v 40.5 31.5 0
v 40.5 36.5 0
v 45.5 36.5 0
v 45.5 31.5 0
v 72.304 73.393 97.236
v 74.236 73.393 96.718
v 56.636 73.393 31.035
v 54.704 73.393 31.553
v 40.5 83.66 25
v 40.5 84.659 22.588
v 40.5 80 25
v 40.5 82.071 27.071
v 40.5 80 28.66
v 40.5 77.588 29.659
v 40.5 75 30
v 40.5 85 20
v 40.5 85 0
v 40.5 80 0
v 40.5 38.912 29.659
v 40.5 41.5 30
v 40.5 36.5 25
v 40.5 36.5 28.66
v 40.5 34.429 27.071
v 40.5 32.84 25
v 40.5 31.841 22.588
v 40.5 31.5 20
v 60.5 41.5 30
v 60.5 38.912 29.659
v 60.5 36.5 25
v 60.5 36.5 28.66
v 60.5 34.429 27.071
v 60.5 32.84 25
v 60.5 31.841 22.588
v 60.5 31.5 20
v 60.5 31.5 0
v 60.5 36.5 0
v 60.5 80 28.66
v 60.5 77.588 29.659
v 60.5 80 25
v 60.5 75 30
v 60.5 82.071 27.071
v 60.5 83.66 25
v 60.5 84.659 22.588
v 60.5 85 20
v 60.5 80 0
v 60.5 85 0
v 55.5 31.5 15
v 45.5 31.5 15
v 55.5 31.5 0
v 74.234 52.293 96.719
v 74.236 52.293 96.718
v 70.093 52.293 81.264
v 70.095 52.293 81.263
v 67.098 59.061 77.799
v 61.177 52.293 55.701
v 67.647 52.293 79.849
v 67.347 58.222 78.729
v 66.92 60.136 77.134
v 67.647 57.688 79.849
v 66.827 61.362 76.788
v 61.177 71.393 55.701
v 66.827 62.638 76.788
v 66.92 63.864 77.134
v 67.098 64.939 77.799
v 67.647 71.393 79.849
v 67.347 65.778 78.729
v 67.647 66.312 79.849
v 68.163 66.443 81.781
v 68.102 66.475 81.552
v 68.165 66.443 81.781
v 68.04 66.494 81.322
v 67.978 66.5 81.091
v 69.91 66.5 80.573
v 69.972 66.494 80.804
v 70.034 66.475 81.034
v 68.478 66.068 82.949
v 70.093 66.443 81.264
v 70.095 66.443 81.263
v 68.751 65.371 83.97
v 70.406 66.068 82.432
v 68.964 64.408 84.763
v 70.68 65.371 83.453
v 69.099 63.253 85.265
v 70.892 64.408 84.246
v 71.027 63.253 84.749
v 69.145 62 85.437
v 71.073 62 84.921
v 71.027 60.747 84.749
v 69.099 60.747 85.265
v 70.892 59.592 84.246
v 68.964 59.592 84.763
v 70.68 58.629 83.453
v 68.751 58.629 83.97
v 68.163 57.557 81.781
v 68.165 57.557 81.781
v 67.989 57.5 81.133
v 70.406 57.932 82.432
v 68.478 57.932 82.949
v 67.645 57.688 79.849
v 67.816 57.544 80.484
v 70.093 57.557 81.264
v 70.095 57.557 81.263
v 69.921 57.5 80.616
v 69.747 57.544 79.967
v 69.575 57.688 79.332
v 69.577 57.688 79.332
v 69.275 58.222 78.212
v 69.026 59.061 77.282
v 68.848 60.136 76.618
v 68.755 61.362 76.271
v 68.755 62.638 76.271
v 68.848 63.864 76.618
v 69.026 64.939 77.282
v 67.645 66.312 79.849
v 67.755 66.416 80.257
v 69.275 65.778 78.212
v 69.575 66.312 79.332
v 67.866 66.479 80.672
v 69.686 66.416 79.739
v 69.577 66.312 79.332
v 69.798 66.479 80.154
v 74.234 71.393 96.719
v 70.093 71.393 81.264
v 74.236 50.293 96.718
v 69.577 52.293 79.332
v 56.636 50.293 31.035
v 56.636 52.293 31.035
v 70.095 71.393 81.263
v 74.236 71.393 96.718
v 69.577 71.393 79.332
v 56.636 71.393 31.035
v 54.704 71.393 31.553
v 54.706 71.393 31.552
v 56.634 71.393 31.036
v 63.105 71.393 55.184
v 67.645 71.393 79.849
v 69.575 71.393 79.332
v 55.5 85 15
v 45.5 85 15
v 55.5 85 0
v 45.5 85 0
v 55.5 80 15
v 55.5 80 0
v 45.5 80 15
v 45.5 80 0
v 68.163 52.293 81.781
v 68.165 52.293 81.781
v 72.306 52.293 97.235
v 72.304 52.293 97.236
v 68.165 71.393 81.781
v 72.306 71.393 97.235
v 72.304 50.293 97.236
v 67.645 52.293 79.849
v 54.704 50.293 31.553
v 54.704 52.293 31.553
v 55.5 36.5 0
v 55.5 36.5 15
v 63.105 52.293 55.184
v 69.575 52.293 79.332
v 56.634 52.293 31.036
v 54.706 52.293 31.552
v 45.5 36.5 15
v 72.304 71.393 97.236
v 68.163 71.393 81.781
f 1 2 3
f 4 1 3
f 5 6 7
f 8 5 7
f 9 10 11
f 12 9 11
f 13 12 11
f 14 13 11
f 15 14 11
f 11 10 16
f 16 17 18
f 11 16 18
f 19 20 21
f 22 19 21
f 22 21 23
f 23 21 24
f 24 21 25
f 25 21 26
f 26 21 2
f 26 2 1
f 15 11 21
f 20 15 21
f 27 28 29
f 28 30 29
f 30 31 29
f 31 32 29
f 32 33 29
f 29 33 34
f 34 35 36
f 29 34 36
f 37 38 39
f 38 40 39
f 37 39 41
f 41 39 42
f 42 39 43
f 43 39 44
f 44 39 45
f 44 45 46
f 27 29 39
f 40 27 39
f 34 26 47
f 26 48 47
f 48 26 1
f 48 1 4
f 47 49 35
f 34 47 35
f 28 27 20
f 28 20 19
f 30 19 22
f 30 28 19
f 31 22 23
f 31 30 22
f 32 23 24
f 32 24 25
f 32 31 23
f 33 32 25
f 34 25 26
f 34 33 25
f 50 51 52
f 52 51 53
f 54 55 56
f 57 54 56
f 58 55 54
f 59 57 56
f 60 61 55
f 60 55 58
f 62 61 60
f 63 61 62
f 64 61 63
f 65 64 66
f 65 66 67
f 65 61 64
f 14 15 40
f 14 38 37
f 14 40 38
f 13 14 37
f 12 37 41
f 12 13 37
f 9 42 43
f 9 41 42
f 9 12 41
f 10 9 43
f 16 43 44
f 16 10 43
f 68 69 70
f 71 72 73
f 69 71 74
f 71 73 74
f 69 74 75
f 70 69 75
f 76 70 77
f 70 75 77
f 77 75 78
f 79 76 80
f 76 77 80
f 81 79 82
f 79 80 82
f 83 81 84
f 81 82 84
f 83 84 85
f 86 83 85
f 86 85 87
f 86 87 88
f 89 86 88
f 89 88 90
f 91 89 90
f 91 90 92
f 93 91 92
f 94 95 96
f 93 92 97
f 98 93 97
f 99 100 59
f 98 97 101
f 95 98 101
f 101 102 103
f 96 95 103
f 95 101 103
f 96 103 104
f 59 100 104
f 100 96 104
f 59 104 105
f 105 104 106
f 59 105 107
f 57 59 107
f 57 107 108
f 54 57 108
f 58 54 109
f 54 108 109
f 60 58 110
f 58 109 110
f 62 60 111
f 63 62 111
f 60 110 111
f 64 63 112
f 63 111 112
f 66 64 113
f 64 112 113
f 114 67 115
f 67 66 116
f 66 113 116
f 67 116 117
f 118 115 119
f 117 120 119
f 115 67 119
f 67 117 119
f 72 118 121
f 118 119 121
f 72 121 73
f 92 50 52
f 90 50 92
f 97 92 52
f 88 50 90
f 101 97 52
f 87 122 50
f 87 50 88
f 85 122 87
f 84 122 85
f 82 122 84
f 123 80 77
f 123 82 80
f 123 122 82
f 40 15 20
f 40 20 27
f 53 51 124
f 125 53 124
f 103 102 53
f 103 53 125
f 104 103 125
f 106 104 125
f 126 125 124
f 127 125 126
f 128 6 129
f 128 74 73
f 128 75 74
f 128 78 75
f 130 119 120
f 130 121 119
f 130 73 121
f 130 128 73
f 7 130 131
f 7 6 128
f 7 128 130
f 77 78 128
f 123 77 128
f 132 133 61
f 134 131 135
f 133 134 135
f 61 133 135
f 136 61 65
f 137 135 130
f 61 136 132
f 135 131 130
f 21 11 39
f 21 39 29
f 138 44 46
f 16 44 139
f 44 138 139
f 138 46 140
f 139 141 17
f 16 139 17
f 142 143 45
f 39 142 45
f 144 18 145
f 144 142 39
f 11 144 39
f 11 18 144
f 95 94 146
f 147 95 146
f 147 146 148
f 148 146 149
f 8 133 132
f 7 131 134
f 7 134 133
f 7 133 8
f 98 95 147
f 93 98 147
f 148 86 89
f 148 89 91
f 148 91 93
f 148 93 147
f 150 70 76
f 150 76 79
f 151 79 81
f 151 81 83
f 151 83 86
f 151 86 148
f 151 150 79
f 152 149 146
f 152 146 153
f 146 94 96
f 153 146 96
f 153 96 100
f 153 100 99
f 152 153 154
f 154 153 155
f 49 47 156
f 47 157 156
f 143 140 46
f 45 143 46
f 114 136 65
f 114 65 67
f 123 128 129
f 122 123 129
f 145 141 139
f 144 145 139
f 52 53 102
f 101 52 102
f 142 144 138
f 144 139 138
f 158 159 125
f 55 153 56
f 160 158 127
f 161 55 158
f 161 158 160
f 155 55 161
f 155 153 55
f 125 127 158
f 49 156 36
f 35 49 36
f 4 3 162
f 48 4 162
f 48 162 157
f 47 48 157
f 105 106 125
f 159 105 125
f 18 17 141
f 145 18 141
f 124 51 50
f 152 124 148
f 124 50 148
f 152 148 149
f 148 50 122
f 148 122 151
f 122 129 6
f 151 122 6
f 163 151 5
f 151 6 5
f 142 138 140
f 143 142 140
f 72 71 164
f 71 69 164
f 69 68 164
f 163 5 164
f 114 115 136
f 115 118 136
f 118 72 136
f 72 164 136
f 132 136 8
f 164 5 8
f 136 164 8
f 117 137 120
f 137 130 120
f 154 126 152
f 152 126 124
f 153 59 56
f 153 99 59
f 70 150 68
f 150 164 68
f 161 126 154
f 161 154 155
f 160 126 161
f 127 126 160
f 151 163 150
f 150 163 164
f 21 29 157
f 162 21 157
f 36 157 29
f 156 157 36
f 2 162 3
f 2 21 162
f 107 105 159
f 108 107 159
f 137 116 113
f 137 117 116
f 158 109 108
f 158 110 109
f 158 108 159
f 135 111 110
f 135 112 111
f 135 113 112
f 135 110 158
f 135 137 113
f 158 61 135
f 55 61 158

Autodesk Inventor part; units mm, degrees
ref_plane "YZ Plane" through (0, 0, 0) normal (1, 0, 0) x (0, 1, 0)
ref_plane "XZ Plane" through (0, 0, 0) normal (0, 1, 0) x (-1, 0, 0)
ref_plane "XY Plane" through (0, 0, 0) normal (0, 0, 1) x (1, 0, 0)
ref_plane "РабПлоскость1" through (0, 0, 0) normal (0, 0, 1) x (1, 0, 0)
sketch "Эскиз1" plane through (0, 0, 0) normal (0, 0, 1) x (1, 0, 0)
  line L0 (63.5, 74.8221) -> (63.5, 48.8221) projected
  line L1 (60.5, 48.8221) -> (60.5, 74.8221) projected
  line L2 (123.5, 102) -> (-123.5, 102) projected
  line L3 (43.5, 11.5) -> (33.5, 11.5) projected
  line L4 (68.5, 11.5) -> (43.5, 11.5) projected
  line L5 (40.5, 31.5) -> (60.5, 31.5)
  line L6 (60.5, 31.5) -> (60.5, 85)
  line L7 (60.5, 85) -> (40.5, 85)
  line L8 (40.5, 85) -> (40.5, 31.5)
  point P0 (0, 0)
  dimension "d0" = 20
  dimension "d1" = 17
  dimension "d2" = 0
  dimension "d3" = 20
extrude "Выдавливание1" add sketch "Эскиз1" along normal blind 30
ref_plane "РабПлоскость2" through (60.5, 31.5, 30) normal (-0.9659258, 0, 0.258819) x (0, 1, 0)
sketch "Эскиз2" plane through (60.5, 31.5, 30) normal (-0.9659258, 0, 0.258819) x (0, 1, 0)
  line L0 (46.5, -71.3991) -> (65.5, -71.3991) projected
  ellipse E0 centre (65.5, -66.5694) end of major axis (70.5, -66.5694) minor radius 4.8296 (65.5, -71.3991) -> (70.5, -66.5694) ccw projected
  line L1 (70.5, -66.5694) -> (70.5, -56.9102) projected
  ellipse E1 centre (65.5, -56.9102) end of major axis (70.5, -56.9102) minor radius 4.8296 (70.5, -56.9102) -> (65.5, -52.0805) ccw projected
  line L2 (65.5, -52.0805) -> (54.0465, -52.0805) projected
  ellipse E2 centre (54.0465, -42.4213) end of major axis (64.0465, -42.4213) minor radius 9.6593 (44.7292, -45.9289) -> (54.0465, -52.0805) ccw projected
  ellipse E3 centre (30.5, -51.2856) end of major axis (45.7717, -51.2856) minor radius 14.7513 (44.7292, -45.9289) -> (30.5, -36.5343) ccw projected
  line L3 (30.5, -36.5343) -> (-7.5, -36.5343) projected
  line L4 (-7.5, -36.5343) -> (-7.5, -31.008) projected
  ellipse E4 centre (6.5042, -17.2158) end of major axis (26.5042, -17.2158) minor radius 19.3185 (-12.2897, -23.8231) -> (-7.5, -31.008) ccw projected
  line L5 (-12.2897, -23.8231) -> (-15.4018, -15.5639) projected
  ellipse E5 centre (-20.1003, -17.2158) end of major axis (-15.1003, -17.2158) minor radius 4.8296 (-15.4018, -15.5639) -> (-20.1003, -12.3861) ccw projected
  line L6 (-20.1003, -12.3861) -> (-40.9046, -12.3861) projected
  ellipse E6 centre (-40.9046, -17.2158) end of major axis (-45.9046, -17.2158) minor radius 4.8296 (-40.9046, -12.3861) -> (-45.8286, -16.3771) ccw projected
  line L7 (-45.8286, -16.3771) -> (-50.2368, -40.5253) projected
  line L8 (-50.2368, -40.5253) -> (-52.0642, -60.7008) projected
  ellipse E7 centre (-47.0832, -61.1217) end of major axis (-52.0832, -61.1217) minor radius 4.8296 (-52.0642, -60.7008) -> (-47.519, -65.933) ccw projected
  line L9 (-47.519, -65.933) -> (14.9298, -71.2104) projected
  ellipse E8 centre (14.0582, -80.8329) end of major axis (4.0582, -80.8329) minor radius 9.6593 (18.7926, -72.3248) -> (14.9298, -71.2104) ccw projected
  ellipse E9 centre (30.5, -51.2856) end of major axis (55.2283, -51.2856) minor radius 23.8857 (18.7926, -72.3248) -> (41.8928, -72.4853) ccw projected
  ellipse E10 centre (46.5, -81.0583) end of major axis (36.5, -81.0583) minor radius 9.6593 (46.5, -71.3991) -> (41.8928, -72.4853) ccw projected
  ellipse E11 centre (30.3221, -55.759) end of major axis (33.8221, -55.759) minor radius 3.3807 projected
  line L10 (0, 0) -> (53.5, 0) projected
  line L11 (41.8928, 0) -> (18.7926, 0)
  line L12 (18.7926, 0) -> (18.7926, -70)
  line L13 (18.7926, -70) -> (41.8928, -70)
  line L14 (41.8928, -70) -> (41.8928, 0)
  circle A0 centre (30.5, -51.2856) radius 4.5
  ellipse E12 centre (30.3619, -58.823) end of major axis (44.3161, -58.823) minor radius 13.4788 (17.3132, -63.5994) -> (17.3137, -63.6006) ccw projected
  ellipse E13 centre (20.8132, -63.6558) end of major axis (17.3132, -63.6558) minor radius 3.3807 (18.8684, -66.4666) -> (17.3137, -63.6006) ccw projected
  ellipse E14 centre (30.3619, -58.823) end of major axis (44.3161, -58.823) minor radius 13.4788 (18.8684, -66.4666) -> (41.8272, -66.506) ccw projected
  ellipse E15 centre (39.8691, -63.7038) end of major axis (36.3691, -63.7038) minor radius 3.3807 (43.3691, -63.7038) -> (41.8272, -66.506) ccw projected
  line L15 (43.3691, -63.7038) -> (43.3691, -65.0724) projected
  ellipse E16 centre (30.3619, -60.1915) end of major axis (16.4077, -60.1915) minor radius 13.4788 (42.4671, -66.8966) -> (43.3691, -65.0724) ccw projected
  ellipse E17 centre (30.3619, -60.1915) end of major axis (16.4077, -60.1915) minor radius 13.4788 (18.2308, -66.8526) -> (42.4671, -66.8966) ccw projected
  ellipse E18 centre (30.3619, -60.1915) end of major axis (16.4077, -60.1915) minor radius 13.4788 (17.3132, -64.968) -> (18.2308, -66.8526) ccw projected
  line L16 (17.3132, -64.968) -> (17.3132, -63.6558) projected
  line L17 (17.3132, -63.6558) -> (17.3132, -63.5994) projected
  line L18 (25.6422, -60.4178) -> (35.002, -60.4178) projected
  ellipse E19 centre (30.3221, -64.0447) end of major axis (36.3221, -64.0447) minor radius 5.7956 (25.6422, -60.4178) -> (35.002, -60.4178) ccw projected
  point P0 (-31.5, 44.6363)
  dimension "d7" = 70
  dimension "d28" = 9
extrude "Выдавливание2" add sketch "Эскиз2" along normal blind 10 contours L14 E15 E14 L13 E13 L12 L3 E3 | E3 L3 L12 L10 L14 | L14 E17 L13 E14 E15 | L14 L13 E17 | E13 E14 L13 E17 L12 | E17 L13 L12 | E11 A0 | L18 E19 picked at (30.1856, -56.8739)
sketch "Эскиз3" plane through (50.8407, 31.5, 32.5882) normal (-0.9659258, 0, 0.258819) x (0.258819, 0, 0.9659258)
  line L0 (70, 41.8928) -> (0, 41.8928) projected
  line L1 (0, 18.7926) -> (70, 18.7926) projected
  line L2 (70, 18.7926) -> (70, 41.8928) projected
  line L3 (0, 18.7926) -> (0, 41.8928) projected
  line L4 (0, 39.8928) -> (50, 39.8928)
  line L5 (50, 39.8928) -> (50, 20.7926)
  line L6 (50, 20.7926) -> (0, 20.7926)
  line L7 (0, 20.7926) -> (0, 39.8928)
  line L8 (50, 20.7926) -> (68, 20.7926)
  line L9 (68, 20.7926) -> (68, 39.8928)
  line L10 (68, 39.8928) -> (50, 39.8928)
  line L11 (52, 39.8928) -> (52, 20.7926)
  point P0 (-44.6363, -31.5)
  dimension "d10" = 2
  dimension "d11" = 2
  dimension "d12" = 2
  dimension "d13" = 50
  dimension "d14" = 2
extrude "Выдавливание3" cut sketch "Эскиз3" against normal blind 4 contours L4 L5 L6 L3 | L10 L9 L8 L11
sketch "Эскиз4" plane through (60.5, 31.5, 30) normal (0.9659258, 0, -0.258819) x (-0.258819, 0, -0.9659258)
  line L0 (-50, 20.7926) -> (0, 20.7926) projected
  line L1 (-68, 20.7926) -> (-52, 20.7926) projected
  line L2 (-68, 39.8928) -> (-68, 20.7926) projected
  line L3 (-52, 39.8928) -> (-68, 39.8928) projected
  line L4 (0, 39.8928) -> (-50, 39.8928) projected
  line L5 (-50, 39.8928) -> (-50, 20.7926) projected
  line L6 (-52, 20.7926) -> (-52, 39.8928) projected
  line L7 (0, 20.7926) -> (0, 39.8928)
  line L8 (0, 18.7926) -> (0, 41.8928) projected
  point P0 (44.6363, -31.5)
extrude "Выдавливание4" cut sketch "Эскиз4" against normal blind 4
sketch "Эскиз5" plane through (78.6173, 73.3928, 97.6148) normal (0, 1, 0) x (0.9659258, 0, -0.258819)
  line L0 (-4, 20) -> (-4, 70) projected
  line L1 (-6, 70) -> (-6, 20) projected
  line L2 (-6, 2) -> (-6, 18) projected
  line L3 (-4, 18) -> (-4, 2) projected
  line L4 (-10, 20) -> (-6, 20) projected
  line L5 (-10, 18) -> (-6, 18) projected
  line L6 (0, 18) -> (-4, 18) projected
  line L7 (0, 20) -> (-4, 20) projected
  line L8 (0, 70) -> (-10, 70) projected
  line L9 (0, 0) -> (-10, 0) projected
  line L10 (-2, 70) -> (-8, 70)
  line L11 (-8, 70) -> (-8, 0)
  line L12 (-8, 0) -> (-2, 0)
  line L13 (-2, 0) -> (-2, 70)
  line L14 (0, 0) -> (0, 70) projected
  line L15 (-10, 0) -> (-10, 70) projected
  line L16 (-4, 2) -> (-6, 2)
  line L17 (0, 0) -> (-10, 0) projected
  line L18 (-6, 70) -> (-4, 70)
  line L19 (-4, 70) -> (-4, 20)
  line L20 (-2, 20) -> (-4, 20)
  line L21 (-6, 20) -> (-6, 70) projected
  line L22 (-6, 20) -> (-8, 20)
  line L23 (-6, 20) -> (-6, 70)
  line L24 (0, 70) -> (-10, 70) projected
  line L25 (-6, 18) -> (-6, 2) projected
  line L26 (-6, 20) -> (-6, 2)
  line L27 (-4, 2) -> (-4, 18) projected
  line L28 (-6, 2) -> (-4, 2)
  line L29 (-4, 2) -> (-4, 20.7345)
  point P0 (-50.6739, 114.6363)
  point P1 (-4, 20)
  point P2 (-4, 18)
  point P3 (-6, 18)
  dimension "d19" = 2
  dimension "d20" = 2
extrude "Выдавливание5" cut sketch "Эскиз5" against normal through all contours L0 L8 L13 L7 | L7 L13 L6 L29 | L13 L8 L14 L7 | L7 L14 L6 L13 | L6 L13 L9 L11 L5 L2 L16 L3 | L6 L14 L9 L13 | L1 L4 L11 L8 | L26 L5 L11 L4 | L11 L4 L15 L8 | L9 L15 L5 L11 | L11 L5 L15 L4
sketch "Эскиз6" plane through (54.7044, 31.5, 31.5529) normal (-0.9659258, 0, 0.258819) x (0.258819, 0, 0.9659258)
  line L0 (68, 41.8928) -> (68, 18.7926) projected
  line L1 (0, 41.8928) -> (68, 41.8928) projected
  line L2 (0, 18.7926) -> (0, 41.8928) projected
  line L3 (68, 18.7926) -> (0, 18.7926) projected
  line L4 (0, 0) -> (0, 53.5) projected
  line L5 (0, 39.8928) -> (25, 39.8928)
  line L6 (25, 39.8928) -> (25, 20.7926)
  line L7 (25, 20.7926) -> (0, 20.7926)
  line L8 (0, 20.7926) -> (0, 39.8928)
  point P0 (-44.6363, -31.5)
  point P1 (0, 20.7926)
  dimension "d23" = 25
  dimension "d24" = 2
  dimension "d25" = 2
extrude "Выдавливание6" cut sketch "Эскиз6" against normal through all contours L5 L6 L7 L2
sketch "Эскиз7" plane through (40.5, 31.5, 0) normal (-1, 0, 0) x (0, 0, 1)
  line L0 (0, 0) -> (0, 53.5) projected
  line L1 (0, 48.5) -> (25, 48.5)
  line L2 (25, 48.5) -> (25, 5)
  line L3 (25, 5) -> (0, 5)
  line L4 (0, 5) -> (0, 48.5)
  line L5 (30, 53.5) -> (30, 0) projected
  line L6 (0, 53.5) -> (30, 53.5) projected
  line L7 (0, 0) -> (30, 0) projected
  point P0 (0, -31.5)
  point P1 (0, 5)
  dimension "d29" = 5
  dimension "d30" = 5
  dimension "d31" = 5
extrude "Выдавливание7" cut sketch "Эскиз7" against normal through all contours L0 L1 L2 L3
fillet "Сопряжение1" radius 10 2 edges at (50.5, 85, 30) (50.5, 31.5, 30)
sketch "Эскиз8" plane through (40.5, 85, 0) normal (0, 1, 0) x (1, 0, 0)
  line L0 (20, 0) -> (0, 0) projected
  line L1 (15, 0) -> (5, 0)
  line L2 (5, 0) -> (5, -15)
  line L3 (5, -15) -> (15, -15)
  line L4 (15, -15) -> (15, 0)
  line L5 (20, -20) -> (0, -20) projected
  line L6 (0, 0) -> (0, -20) projected
  line L7 (20, 0) -> (20, -20) projected
  point P0 (-40.5, 0)
  point P1 (5, 0)
  dimension "d35" = 5
  dimension "d36" = 5
  dimension "d37" = 5
extrude "Выдавливание8" cut sketch "Эскиз8" against normal through all contours L4 L3 L2 L0
properties part number "Кранштейн сервомоторов"
